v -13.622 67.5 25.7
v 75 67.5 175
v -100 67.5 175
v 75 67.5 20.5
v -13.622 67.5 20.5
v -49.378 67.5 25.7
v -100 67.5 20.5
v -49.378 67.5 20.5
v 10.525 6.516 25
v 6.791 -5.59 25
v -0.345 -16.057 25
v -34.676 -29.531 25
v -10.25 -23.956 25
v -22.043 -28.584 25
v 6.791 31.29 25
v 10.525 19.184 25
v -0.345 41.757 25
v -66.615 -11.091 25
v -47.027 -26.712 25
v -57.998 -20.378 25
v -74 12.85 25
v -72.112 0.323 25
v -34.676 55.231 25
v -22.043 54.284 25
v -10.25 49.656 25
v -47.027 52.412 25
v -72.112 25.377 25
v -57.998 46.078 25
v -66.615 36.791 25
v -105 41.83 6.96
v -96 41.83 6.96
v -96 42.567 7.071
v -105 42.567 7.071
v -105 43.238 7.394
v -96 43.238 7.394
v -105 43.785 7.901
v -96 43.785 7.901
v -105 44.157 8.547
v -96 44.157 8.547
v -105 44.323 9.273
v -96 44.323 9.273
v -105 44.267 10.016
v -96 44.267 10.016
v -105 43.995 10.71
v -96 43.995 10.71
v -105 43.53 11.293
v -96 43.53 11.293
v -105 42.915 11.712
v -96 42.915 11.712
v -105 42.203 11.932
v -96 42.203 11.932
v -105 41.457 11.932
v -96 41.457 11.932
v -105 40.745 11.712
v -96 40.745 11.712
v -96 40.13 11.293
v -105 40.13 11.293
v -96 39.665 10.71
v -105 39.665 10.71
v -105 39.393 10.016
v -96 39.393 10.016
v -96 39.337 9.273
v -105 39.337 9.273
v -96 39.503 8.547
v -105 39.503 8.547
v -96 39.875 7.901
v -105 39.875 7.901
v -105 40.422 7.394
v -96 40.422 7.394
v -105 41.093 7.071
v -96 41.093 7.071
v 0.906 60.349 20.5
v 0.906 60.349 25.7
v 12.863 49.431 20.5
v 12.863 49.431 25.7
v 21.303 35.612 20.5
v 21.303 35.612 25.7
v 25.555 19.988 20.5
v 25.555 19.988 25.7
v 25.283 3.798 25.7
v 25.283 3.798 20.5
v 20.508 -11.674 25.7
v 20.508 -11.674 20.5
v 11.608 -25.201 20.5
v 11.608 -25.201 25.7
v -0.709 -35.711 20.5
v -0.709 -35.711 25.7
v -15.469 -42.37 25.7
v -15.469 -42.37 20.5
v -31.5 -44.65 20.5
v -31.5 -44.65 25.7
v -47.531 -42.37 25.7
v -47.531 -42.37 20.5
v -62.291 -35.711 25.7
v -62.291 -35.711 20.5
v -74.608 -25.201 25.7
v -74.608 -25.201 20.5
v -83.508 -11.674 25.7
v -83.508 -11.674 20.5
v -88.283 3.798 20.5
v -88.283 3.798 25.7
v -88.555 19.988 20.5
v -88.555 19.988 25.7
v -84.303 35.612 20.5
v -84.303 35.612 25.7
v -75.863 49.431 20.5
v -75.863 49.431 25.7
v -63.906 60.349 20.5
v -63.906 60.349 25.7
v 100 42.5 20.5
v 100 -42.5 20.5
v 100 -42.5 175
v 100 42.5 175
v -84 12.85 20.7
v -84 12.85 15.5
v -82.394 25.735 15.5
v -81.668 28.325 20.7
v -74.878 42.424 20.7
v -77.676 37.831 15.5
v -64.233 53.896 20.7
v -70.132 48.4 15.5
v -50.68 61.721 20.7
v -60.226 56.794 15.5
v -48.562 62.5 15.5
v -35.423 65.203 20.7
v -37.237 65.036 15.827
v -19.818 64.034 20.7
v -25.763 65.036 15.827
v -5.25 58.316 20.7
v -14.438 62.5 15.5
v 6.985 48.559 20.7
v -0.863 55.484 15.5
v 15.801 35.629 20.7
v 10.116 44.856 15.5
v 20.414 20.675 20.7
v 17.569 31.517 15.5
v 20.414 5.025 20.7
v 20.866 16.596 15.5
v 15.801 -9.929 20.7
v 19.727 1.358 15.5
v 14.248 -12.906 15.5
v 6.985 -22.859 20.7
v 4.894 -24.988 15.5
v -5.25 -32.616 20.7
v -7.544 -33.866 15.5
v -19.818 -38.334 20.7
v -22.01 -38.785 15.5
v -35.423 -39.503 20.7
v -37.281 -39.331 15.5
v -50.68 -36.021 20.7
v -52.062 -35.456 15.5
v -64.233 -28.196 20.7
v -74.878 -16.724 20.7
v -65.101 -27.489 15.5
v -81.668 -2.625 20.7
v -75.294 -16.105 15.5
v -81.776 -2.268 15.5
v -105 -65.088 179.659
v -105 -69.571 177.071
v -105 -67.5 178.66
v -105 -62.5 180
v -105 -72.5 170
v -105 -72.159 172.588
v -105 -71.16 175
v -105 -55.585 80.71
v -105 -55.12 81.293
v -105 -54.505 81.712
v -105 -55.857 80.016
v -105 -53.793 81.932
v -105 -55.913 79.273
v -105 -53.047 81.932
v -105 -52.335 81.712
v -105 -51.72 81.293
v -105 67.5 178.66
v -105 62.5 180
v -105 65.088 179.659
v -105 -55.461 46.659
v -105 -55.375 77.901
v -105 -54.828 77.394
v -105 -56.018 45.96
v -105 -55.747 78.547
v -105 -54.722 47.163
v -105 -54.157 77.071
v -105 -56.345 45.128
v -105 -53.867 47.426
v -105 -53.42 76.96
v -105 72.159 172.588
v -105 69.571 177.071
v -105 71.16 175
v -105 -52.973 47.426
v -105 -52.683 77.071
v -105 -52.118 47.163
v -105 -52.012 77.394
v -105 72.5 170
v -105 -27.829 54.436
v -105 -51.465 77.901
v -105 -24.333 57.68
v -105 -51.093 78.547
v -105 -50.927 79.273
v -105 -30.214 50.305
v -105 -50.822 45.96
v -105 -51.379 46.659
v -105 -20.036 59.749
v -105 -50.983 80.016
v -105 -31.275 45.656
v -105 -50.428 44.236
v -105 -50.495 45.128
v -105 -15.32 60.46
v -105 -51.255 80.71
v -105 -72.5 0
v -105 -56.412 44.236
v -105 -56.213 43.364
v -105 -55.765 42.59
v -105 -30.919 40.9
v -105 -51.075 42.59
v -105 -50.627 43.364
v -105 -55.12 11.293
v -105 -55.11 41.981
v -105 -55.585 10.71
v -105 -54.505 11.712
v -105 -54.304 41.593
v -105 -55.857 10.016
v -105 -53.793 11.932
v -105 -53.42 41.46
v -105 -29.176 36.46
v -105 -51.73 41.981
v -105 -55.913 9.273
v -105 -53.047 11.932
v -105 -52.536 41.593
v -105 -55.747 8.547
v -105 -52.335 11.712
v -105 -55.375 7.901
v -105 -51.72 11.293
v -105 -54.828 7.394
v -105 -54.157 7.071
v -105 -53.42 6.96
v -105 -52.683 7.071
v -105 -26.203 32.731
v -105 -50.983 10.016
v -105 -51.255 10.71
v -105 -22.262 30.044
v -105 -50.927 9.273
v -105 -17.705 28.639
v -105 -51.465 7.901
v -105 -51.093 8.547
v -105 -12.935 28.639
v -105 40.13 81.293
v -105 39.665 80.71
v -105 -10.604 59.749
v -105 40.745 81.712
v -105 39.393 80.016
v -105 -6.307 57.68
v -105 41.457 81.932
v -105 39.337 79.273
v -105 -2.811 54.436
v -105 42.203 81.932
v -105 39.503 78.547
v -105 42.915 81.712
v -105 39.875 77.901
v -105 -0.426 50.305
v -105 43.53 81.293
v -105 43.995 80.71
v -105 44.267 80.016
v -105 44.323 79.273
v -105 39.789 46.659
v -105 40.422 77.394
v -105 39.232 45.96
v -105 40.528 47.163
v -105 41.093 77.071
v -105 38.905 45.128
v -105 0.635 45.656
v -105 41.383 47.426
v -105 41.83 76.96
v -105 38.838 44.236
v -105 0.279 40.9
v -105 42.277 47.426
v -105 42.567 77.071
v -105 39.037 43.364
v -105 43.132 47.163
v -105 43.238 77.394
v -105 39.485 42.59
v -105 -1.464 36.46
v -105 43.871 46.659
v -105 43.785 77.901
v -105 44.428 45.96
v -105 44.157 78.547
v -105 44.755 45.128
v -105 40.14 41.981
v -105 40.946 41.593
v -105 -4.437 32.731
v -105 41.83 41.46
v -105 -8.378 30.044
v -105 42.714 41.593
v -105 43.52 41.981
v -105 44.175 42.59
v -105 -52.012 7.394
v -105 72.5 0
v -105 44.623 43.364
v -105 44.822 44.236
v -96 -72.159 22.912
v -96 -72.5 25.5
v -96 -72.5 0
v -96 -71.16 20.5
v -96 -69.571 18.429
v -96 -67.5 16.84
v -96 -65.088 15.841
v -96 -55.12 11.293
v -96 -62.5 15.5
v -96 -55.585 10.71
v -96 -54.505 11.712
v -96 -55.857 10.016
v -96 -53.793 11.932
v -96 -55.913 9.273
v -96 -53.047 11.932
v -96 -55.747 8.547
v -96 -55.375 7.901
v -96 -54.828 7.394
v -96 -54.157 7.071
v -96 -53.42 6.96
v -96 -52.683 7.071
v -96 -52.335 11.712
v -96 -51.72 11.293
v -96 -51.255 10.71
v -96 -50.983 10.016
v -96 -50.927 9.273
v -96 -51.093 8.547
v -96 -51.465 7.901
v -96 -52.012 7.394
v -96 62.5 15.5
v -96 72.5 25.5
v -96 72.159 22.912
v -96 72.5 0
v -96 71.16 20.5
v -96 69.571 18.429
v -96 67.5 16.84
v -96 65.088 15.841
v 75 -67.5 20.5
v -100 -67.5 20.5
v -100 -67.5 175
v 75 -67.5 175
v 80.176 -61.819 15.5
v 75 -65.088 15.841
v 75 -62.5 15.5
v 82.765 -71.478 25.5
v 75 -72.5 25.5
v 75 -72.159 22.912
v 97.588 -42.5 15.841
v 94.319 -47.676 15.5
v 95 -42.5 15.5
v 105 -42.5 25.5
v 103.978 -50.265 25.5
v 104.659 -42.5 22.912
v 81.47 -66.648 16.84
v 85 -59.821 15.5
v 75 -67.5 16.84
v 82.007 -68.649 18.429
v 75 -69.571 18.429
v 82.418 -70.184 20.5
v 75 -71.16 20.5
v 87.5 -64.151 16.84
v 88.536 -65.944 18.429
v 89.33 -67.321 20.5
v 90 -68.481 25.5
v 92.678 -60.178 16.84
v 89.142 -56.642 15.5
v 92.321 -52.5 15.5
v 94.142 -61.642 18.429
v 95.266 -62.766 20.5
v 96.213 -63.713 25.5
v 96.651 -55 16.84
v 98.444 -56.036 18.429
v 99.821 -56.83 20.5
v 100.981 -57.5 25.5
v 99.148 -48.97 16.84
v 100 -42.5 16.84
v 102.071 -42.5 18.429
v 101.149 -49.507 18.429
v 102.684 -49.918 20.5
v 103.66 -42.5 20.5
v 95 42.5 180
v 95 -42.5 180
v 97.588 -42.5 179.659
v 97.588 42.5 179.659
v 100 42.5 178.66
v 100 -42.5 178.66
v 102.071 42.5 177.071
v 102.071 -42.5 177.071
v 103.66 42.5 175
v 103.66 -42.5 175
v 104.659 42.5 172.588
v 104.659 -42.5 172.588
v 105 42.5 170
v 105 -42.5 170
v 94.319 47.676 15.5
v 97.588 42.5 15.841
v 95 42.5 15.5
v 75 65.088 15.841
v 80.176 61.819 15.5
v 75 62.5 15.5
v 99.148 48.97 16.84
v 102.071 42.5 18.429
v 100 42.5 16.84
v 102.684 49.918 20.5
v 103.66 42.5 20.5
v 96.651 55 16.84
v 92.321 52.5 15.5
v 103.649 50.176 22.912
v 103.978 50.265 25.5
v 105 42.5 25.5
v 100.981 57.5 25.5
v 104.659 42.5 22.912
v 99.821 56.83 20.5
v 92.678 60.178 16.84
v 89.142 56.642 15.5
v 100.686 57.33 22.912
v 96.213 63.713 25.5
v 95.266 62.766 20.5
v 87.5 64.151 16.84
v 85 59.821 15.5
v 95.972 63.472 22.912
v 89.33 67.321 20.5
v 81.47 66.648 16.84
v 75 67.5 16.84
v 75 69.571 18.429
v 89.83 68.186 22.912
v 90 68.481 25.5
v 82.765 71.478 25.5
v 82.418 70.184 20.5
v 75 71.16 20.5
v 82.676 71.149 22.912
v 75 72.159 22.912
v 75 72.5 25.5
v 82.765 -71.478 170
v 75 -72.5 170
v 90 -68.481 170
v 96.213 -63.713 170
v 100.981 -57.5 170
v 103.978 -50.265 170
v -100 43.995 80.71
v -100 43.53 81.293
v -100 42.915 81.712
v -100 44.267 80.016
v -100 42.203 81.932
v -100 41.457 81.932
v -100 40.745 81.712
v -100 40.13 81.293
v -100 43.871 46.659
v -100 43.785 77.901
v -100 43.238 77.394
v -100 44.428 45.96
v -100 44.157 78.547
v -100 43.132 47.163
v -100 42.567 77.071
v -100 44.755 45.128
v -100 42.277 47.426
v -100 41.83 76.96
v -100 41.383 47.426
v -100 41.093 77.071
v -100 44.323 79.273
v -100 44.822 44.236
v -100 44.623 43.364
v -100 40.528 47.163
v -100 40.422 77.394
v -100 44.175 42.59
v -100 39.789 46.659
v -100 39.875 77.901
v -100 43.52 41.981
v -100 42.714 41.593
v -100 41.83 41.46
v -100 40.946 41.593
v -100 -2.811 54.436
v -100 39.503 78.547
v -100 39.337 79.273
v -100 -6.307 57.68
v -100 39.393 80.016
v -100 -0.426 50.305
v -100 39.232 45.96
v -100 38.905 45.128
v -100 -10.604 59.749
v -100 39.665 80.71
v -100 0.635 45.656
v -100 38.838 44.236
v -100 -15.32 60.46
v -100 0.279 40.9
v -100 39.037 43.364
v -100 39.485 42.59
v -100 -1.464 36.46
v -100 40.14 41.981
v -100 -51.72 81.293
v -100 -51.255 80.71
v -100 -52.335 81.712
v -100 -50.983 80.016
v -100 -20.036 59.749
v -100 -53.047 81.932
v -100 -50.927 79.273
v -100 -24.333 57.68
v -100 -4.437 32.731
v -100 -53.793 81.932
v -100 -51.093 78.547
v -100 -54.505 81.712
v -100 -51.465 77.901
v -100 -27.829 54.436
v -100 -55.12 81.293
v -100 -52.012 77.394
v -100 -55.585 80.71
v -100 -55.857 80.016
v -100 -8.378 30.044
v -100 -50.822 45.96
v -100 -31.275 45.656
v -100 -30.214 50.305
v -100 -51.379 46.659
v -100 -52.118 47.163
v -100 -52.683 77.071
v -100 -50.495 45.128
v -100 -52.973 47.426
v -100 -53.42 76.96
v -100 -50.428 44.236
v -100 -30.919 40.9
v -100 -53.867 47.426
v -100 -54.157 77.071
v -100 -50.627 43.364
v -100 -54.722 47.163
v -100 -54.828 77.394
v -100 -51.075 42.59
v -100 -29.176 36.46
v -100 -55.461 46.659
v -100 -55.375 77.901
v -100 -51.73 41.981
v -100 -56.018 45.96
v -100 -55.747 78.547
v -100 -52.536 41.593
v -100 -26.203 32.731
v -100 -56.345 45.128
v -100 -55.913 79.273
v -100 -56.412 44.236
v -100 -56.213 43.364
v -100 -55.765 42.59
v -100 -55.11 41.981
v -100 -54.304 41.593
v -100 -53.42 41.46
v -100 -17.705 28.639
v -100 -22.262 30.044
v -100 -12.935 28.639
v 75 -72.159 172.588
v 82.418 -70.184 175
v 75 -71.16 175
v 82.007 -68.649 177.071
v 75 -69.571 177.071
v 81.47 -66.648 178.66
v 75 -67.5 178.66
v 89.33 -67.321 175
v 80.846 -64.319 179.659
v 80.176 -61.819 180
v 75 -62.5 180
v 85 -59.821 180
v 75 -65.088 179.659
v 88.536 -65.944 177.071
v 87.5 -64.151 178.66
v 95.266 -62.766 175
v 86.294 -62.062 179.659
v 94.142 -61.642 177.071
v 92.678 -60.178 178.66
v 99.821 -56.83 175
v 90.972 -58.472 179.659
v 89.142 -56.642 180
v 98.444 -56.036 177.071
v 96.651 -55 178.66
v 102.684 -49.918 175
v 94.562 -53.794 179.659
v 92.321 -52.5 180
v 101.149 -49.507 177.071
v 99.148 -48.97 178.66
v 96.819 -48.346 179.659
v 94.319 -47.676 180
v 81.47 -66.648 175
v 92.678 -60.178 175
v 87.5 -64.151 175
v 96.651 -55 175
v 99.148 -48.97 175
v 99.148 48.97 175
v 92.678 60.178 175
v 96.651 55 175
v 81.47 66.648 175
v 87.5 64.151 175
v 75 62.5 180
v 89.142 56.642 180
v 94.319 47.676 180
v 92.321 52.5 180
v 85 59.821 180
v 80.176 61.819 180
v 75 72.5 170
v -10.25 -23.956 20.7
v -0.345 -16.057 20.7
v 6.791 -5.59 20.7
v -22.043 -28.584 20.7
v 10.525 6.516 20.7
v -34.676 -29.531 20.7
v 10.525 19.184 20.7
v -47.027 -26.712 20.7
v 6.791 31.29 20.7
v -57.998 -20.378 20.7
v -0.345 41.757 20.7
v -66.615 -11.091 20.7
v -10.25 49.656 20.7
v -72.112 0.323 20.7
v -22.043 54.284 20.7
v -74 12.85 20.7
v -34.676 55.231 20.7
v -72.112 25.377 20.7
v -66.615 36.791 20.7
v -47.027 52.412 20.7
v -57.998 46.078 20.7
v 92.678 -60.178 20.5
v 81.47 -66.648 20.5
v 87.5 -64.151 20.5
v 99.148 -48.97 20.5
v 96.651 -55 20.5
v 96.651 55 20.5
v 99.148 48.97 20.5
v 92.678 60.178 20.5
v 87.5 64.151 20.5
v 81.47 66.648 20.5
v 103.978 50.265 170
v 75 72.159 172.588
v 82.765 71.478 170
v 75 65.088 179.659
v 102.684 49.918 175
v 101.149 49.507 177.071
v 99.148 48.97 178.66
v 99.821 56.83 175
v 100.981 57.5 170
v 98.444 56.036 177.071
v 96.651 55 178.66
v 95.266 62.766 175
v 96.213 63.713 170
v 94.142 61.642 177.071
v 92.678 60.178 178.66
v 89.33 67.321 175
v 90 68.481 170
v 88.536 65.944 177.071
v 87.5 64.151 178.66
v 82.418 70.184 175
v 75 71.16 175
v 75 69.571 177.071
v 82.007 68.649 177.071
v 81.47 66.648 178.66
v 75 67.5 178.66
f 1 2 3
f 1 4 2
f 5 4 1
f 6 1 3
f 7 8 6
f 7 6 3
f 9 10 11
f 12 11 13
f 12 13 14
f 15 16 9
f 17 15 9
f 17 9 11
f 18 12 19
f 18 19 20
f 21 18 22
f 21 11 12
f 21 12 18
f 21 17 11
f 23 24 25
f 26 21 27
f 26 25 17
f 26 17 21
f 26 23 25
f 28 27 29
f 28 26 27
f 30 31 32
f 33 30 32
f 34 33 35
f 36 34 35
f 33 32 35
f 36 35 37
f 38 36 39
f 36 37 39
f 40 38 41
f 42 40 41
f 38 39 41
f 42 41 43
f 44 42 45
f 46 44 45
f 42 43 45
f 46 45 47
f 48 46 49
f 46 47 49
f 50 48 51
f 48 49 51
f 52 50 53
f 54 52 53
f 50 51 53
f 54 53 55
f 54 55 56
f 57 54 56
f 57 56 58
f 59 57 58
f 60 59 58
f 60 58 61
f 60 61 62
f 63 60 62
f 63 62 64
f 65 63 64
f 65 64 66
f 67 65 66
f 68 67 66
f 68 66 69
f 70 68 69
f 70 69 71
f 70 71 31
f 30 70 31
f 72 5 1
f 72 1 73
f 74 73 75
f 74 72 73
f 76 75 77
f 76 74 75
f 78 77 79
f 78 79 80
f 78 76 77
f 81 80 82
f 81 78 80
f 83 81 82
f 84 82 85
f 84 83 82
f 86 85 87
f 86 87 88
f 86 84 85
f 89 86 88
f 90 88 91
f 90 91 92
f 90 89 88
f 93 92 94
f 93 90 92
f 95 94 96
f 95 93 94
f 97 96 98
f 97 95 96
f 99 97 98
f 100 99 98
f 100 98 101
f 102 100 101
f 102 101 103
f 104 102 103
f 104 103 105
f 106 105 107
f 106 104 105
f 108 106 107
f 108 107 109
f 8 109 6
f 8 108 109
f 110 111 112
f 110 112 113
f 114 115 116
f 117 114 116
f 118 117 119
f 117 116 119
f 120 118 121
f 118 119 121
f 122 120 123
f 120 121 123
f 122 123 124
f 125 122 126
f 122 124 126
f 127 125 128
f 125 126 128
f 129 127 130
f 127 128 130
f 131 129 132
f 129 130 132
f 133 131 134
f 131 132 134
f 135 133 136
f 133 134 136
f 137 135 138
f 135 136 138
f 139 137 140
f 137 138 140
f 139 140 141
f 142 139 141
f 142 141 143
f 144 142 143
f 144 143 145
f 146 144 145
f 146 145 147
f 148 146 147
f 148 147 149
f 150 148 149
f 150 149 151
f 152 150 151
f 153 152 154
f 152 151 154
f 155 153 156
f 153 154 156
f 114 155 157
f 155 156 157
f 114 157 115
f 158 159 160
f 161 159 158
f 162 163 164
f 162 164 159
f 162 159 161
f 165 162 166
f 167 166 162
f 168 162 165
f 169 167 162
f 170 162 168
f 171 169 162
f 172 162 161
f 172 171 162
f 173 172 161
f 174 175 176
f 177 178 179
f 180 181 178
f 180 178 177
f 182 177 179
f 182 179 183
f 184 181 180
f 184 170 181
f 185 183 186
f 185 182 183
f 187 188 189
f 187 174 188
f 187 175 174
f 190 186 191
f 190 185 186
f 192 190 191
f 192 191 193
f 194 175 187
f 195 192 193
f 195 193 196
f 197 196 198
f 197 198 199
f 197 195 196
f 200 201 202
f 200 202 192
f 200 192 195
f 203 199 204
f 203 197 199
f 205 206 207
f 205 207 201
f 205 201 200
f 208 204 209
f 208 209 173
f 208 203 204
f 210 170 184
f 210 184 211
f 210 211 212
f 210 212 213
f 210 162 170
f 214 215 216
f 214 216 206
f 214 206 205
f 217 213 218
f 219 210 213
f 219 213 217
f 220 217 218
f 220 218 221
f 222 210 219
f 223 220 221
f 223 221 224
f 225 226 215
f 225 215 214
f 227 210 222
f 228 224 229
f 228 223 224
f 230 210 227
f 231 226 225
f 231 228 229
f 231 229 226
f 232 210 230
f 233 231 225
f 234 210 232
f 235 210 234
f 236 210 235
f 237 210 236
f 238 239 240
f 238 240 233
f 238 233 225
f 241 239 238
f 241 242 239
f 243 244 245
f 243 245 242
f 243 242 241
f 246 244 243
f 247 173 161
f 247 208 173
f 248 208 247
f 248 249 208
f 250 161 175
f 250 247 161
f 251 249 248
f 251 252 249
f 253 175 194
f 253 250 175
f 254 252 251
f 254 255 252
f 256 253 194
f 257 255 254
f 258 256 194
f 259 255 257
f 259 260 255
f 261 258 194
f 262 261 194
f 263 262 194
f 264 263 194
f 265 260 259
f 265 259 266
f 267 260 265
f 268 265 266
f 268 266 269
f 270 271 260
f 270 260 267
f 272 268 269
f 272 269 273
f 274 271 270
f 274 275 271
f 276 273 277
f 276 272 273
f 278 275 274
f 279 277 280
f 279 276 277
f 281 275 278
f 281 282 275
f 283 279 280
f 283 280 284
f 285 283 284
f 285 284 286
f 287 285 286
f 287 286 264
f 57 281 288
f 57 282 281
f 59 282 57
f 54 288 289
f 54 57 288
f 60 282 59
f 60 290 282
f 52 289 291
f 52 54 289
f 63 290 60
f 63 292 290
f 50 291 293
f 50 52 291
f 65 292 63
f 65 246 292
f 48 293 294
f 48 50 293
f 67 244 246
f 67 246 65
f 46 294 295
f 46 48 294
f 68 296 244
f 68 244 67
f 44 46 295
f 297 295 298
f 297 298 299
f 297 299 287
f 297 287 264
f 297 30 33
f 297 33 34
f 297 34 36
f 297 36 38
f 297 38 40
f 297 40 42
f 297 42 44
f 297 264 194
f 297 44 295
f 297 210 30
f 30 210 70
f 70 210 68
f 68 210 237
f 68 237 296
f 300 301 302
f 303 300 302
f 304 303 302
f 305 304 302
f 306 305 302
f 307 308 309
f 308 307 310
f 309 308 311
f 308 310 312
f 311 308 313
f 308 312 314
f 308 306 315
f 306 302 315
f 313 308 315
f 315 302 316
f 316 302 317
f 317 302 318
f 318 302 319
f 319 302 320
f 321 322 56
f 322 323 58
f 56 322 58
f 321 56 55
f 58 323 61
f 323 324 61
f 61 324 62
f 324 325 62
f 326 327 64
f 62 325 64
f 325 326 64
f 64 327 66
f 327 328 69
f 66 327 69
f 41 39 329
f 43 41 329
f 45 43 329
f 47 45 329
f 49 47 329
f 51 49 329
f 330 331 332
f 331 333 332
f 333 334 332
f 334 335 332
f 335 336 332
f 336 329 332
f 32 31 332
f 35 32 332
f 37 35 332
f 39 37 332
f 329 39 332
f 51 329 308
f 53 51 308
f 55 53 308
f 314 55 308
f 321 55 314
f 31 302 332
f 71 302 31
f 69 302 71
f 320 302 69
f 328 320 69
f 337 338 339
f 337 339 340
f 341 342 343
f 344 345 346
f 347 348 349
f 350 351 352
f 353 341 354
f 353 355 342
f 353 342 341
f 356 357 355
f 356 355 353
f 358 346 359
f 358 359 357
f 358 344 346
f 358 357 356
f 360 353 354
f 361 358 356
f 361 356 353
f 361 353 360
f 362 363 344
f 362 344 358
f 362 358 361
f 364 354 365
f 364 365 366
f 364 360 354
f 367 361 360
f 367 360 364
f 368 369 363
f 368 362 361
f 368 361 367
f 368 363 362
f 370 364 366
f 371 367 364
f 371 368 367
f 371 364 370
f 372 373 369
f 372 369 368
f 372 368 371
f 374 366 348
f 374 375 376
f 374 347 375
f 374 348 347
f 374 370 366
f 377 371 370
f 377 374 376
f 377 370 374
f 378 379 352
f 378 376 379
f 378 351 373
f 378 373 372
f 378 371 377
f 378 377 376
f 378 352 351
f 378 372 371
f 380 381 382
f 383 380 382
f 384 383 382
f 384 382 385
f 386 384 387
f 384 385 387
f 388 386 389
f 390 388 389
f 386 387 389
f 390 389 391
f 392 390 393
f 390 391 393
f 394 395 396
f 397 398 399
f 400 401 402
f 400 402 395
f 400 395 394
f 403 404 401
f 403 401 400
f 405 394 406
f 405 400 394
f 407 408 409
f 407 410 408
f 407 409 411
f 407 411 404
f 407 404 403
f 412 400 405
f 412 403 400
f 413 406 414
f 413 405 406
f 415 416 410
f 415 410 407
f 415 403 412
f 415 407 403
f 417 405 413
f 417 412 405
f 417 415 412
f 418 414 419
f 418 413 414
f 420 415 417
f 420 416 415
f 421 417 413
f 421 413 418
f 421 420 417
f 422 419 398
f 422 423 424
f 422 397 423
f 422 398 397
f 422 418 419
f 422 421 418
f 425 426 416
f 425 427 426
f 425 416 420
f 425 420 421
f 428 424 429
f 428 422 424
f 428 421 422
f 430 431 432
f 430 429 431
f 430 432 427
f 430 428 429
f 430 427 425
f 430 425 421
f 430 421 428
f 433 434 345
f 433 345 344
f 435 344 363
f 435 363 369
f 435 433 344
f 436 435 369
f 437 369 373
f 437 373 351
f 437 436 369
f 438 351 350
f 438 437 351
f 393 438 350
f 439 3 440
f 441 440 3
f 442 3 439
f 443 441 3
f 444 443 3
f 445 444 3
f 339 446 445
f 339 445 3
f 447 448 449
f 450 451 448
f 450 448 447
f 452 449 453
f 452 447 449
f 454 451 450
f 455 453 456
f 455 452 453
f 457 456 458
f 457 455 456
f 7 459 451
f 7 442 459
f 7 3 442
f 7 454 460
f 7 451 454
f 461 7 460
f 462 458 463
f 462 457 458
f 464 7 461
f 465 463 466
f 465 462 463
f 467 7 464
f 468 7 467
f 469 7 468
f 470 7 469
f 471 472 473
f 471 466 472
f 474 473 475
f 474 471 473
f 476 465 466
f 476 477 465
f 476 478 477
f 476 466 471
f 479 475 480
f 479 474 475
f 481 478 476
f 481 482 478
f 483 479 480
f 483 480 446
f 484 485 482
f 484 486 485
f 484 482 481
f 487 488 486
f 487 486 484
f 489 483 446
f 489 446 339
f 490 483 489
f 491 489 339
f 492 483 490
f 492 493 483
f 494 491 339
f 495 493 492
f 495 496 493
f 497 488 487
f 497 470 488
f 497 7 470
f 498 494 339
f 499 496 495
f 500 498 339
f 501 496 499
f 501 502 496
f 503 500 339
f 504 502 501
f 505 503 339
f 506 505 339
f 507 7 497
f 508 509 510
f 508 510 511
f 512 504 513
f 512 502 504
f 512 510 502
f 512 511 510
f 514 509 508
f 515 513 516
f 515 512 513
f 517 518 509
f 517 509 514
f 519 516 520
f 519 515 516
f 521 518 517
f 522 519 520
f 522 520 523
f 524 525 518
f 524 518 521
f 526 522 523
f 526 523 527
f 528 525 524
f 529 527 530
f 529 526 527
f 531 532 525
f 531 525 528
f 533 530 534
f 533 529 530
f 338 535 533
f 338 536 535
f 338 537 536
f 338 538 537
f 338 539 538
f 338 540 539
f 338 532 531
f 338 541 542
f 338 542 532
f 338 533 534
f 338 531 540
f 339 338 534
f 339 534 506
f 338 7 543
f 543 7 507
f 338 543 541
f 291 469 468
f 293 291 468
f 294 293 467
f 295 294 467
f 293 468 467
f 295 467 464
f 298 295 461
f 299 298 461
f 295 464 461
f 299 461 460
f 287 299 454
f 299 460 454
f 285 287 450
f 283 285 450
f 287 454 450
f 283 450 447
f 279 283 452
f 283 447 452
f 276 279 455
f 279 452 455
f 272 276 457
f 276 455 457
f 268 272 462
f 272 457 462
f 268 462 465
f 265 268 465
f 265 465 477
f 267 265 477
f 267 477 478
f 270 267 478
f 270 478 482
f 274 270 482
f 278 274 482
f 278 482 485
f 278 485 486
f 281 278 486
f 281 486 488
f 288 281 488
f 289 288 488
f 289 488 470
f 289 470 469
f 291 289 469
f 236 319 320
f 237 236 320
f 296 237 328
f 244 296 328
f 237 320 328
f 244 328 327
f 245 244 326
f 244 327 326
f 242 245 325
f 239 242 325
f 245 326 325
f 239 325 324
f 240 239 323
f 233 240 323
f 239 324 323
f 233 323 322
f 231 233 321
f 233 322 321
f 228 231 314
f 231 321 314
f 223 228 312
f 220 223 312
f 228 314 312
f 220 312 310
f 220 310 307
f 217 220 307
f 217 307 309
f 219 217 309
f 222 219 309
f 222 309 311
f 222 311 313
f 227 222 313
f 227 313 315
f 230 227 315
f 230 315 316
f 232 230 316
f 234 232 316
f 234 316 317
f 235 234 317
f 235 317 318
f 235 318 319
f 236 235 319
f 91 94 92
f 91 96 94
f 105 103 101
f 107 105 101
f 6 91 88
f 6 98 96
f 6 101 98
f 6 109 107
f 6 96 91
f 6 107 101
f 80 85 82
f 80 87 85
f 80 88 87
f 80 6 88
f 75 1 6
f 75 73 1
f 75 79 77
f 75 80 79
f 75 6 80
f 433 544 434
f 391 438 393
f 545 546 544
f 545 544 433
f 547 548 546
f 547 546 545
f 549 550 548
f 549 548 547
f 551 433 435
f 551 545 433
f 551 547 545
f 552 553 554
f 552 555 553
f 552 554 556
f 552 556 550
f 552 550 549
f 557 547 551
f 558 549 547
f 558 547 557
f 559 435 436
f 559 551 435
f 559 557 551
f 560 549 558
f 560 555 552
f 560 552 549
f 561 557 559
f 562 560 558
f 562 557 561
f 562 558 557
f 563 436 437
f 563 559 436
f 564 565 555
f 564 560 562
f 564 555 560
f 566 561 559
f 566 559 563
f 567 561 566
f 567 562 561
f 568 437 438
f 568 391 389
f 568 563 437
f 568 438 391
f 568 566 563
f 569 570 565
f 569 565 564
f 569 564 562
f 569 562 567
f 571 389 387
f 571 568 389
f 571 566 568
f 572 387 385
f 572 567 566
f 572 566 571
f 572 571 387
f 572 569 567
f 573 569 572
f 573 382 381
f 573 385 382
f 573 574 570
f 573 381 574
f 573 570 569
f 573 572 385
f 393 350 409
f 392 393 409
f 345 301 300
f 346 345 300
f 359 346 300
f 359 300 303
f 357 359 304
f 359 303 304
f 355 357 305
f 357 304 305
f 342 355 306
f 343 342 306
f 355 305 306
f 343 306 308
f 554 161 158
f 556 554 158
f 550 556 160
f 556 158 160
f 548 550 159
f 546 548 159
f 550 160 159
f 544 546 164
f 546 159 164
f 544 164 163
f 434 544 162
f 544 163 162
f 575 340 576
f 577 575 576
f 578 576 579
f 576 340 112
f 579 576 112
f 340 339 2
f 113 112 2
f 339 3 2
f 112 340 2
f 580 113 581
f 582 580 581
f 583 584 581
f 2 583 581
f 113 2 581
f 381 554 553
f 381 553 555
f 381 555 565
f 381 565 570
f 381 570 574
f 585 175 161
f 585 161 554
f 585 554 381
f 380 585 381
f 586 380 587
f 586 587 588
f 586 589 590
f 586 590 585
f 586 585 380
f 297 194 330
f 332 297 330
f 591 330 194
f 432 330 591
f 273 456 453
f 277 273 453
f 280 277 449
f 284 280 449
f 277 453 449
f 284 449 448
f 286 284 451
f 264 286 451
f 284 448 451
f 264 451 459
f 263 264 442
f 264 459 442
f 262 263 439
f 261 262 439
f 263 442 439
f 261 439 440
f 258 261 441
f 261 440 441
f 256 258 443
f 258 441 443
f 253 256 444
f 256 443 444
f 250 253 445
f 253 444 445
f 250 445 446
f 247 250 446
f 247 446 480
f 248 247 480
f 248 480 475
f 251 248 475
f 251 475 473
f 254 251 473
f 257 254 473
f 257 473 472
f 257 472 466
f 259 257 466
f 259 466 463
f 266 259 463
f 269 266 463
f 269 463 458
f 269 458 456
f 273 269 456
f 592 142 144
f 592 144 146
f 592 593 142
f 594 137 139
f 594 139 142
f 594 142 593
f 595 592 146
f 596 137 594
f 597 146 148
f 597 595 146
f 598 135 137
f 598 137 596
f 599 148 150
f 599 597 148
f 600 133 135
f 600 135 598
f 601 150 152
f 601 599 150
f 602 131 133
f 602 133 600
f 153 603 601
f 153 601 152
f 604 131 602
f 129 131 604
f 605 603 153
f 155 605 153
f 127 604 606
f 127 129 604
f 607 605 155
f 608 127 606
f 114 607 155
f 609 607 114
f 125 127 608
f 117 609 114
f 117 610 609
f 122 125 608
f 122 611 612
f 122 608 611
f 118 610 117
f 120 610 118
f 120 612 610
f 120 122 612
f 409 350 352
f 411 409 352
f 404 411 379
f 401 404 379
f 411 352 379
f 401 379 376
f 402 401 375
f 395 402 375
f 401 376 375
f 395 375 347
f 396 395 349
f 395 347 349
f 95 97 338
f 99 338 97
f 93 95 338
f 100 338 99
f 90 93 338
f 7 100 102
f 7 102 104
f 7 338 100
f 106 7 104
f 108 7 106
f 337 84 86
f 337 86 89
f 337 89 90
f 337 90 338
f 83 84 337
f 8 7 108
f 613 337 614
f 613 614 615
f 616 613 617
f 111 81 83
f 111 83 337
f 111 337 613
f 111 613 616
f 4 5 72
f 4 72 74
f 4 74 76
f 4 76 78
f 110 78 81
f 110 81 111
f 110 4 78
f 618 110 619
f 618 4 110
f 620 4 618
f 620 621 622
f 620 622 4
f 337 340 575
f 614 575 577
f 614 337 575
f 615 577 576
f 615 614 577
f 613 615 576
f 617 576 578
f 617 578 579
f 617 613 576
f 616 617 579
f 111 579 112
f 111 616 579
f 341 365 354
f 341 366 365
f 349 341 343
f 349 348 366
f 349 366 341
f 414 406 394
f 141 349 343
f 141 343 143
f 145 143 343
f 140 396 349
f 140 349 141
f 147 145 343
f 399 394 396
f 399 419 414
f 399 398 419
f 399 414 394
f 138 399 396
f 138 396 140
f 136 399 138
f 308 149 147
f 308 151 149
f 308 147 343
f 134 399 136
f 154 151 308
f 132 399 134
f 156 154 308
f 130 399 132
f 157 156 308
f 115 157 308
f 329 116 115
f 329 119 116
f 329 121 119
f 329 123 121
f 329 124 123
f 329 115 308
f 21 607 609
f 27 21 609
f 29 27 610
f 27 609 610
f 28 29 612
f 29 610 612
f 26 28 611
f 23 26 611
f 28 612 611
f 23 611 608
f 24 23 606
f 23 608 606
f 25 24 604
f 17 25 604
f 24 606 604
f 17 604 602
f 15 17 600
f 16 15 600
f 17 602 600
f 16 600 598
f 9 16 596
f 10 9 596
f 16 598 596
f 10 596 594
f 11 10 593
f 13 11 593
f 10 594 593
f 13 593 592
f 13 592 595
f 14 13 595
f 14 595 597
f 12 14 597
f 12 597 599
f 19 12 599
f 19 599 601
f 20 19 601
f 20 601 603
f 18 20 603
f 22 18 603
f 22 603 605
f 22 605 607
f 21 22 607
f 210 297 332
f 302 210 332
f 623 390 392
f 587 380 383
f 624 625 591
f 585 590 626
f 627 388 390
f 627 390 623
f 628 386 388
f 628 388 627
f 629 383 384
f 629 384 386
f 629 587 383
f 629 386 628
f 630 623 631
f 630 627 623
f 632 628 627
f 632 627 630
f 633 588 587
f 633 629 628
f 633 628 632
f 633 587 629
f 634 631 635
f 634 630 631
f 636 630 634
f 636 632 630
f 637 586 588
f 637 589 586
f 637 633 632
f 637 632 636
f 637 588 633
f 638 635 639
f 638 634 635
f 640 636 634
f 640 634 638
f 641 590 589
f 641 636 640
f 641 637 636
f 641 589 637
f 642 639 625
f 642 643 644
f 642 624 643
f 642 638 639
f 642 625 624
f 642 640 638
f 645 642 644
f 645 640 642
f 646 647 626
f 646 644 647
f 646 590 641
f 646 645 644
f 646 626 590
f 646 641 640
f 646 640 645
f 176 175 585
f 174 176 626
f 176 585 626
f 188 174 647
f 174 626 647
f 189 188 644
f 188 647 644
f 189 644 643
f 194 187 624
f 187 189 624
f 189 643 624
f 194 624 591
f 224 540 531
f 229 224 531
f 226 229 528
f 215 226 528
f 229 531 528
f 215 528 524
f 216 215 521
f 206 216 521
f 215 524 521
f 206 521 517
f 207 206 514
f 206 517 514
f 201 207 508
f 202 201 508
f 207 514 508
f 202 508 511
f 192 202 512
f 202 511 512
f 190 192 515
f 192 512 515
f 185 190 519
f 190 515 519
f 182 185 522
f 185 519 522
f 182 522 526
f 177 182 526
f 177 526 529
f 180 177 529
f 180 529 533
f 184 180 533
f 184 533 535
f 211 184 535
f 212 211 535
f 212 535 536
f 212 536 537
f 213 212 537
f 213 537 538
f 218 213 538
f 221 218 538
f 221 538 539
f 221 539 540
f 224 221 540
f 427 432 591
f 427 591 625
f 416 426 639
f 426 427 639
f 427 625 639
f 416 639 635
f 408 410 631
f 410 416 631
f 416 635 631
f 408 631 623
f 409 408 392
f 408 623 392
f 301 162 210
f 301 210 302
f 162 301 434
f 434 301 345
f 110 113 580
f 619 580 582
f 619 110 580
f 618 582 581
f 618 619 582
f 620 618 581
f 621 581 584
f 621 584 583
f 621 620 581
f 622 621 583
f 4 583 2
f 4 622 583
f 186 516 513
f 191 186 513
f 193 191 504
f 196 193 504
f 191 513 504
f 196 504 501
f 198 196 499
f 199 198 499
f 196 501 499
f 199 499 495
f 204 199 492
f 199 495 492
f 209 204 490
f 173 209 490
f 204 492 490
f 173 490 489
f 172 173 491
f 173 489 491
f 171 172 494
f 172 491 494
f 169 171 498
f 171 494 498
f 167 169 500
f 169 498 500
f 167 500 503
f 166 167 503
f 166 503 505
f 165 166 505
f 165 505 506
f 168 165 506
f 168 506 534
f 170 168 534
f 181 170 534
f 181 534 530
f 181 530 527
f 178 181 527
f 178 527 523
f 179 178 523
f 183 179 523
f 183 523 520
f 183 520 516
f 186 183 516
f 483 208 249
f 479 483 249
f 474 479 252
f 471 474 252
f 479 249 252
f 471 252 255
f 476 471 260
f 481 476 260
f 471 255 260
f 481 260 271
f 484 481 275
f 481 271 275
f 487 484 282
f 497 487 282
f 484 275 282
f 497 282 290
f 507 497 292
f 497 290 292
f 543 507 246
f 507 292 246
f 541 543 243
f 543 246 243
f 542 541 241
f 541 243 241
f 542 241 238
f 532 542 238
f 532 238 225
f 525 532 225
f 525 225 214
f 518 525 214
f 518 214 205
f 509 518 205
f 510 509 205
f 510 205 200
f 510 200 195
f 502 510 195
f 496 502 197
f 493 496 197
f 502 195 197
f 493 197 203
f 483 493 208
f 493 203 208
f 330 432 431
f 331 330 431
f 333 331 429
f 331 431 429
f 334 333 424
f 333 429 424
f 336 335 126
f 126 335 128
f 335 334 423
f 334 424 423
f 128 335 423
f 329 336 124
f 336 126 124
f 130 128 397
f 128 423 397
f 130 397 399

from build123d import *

# Parameters (mm, degrees)
SKETCH1_W                 = 210
SKETCH1_H                 = 145
BOSS_EXTRUDE1_DEPTH       = 180
SKETCH9_W                 = 201
SKETCH9_H                 = 145
CUT_EXTRUDE4_DEPTH        = 15.5
SKETCH2_R                 = 42.5
CUT_EXTRUDE1_DEPTH        = 25
SKETCH3_R                 = 52.5
CUT_EXTRUDE2_DEPTH        = 5.2
SKETCH4_R                 = 16
CUT_EXTRUDE3_DEPTH        = 5
FILLET1_R                 = 30
SHELL1_START              = 25.7
SHELL1_DEPTH              = 149.3
SHELL1_START_2            = 20.5
SHELL1_2_DEPTH            = 5.2
M6_TAPPED_HOLE1_D         = 5
M6_TAPPED_HOLE1_DEPTH     = 10
M6_TAPPED_HOLE1_TIP       = 1.502151548
F_6_0MM_DOWEL_HOLE1_D     = 6
F_6_0MM_DOWEL_HOLE1_DEPTH = 13
F_6_0MM_DOWEL_HOLE1_TIP   = 1.802581857
FILLET2_R                 = 10


# Read off the part's stored shape, not the designer's step: Shell1
with BuildPart() as part:
    # Sketch1 → Boss-Extrude1 (new body)
    with BuildSketch(Plane.XY):
        Rectangle(SKETCH1_W, SKETCH1_H)
    extrude(amount=BOSS_EXTRUDE1_DEPTH)

    # Sketch9 → Cut-Extrude4 (cut)
    with BuildSketch(Plane(origin=(0, 0, 0), x_dir=(-1, 0, 0), z_dir=(0, 0, -1))):
        with Locations((-4.5, 0)):
            Rectangle(SKETCH9_W, SKETCH9_H)
    extrude(amount=-CUT_EXTRUDE4_DEPTH, mode=Mode.SUBTRACT)

    # Sketch2 → Cut-Extrude1 (cut)
    with BuildSketch(Plane(origin=(0, 0, 0), x_dir=(-1, 0, 0), z_dir=(0, 0, -1))):
        with Locations((31.5, 12.85)):
            Circle(SKETCH2_R)
    extrude(amount=-CUT_EXTRUDE1_DEPTH, mode=Mode.SUBTRACT)

    # Sketch3 → Cut-Extrude2 (cut)
    with BuildSketch(Plane(origin=(0, 0, 15.5), x_dir=(-1, 0, 0), z_dir=(0, 0, -1))):
        with Locations((31.5, 12.85)):
            Circle(SKETCH3_R)
    extrude(amount=-CUT_EXTRUDE2_DEPTH, mode=Mode.SUBTRACT)

    # Sketch4 → Cut-Extrude3 (cut)
    with BuildSketch(Plane.ZY.offset(105)):
        with Locations((44.46, -15.32)):
            Circle(SKETCH4_R)
    extrude(amount=-CUT_EXTRUDE3_DEPTH, mode=Mode.SUBTRACT)

    # Fillet1
    fillet1_edges = [part.edges().sort_by_distance(p)[0] for p in [
        (105, -72.5, 97.75),
        (105, 72.5, 97.75),
    ]]
    fillet(fillet1_edges, radius=FILLET1_R)

    # Shell1 outline → Shell1 (cut)
    with BuildSketch(Plane.XY.offset(SHELL1_START)):
        with BuildLine():
            Line((-100, -67.5), (75, -67.5))
            ThreePointArc((75, -67.5), (92.67766953, -60.17766953), (100, -42.5))
            Line((100, -42.5), (100, 42.5))
            ThreePointArc((100, 42.5), (92.67766953, 60.17766953), (75, 67.5))
            Line((75, 67.5), (-100, 67.5))
            Line((-100, 67.5), (-100, -67.5))
        make_face()
    extrude(amount=SHELL1_DEPTH, mode=Mode.SUBTRACT)

    # Shell1 2 outline → Shell1 2 (cut)
    with BuildSketch(Plane.XY.offset(SHELL1_START_2)):
        with BuildLine():
            Line((-100, 67.5), (-100, -67.5))
            Line((-100, -67.5), (75, -67.5))
            ThreePointArc((75, -67.5), (92.67766953, -60.17766953), (100, -42.5))
            Line((100, -42.5), (100, 42.5))
            ThreePointArc((100, 42.5), (92.67766953, 60.17766953), (75, 67.5))
            Line((75, 67.5), (-13.621870903, 67.5))
            ThreePointArc((-13.621870903, 67.5), (-31.5, -44.65), (-49.378129097, 67.5))
            Line((-49.378129097, 67.5), (-100, 67.5))
        make_face()
    extrude(amount=SHELL1_2_DEPTH, mode=Mode.SUBTRACT)

    # M6 Tapped Hole1
    with Locations(Plane.ZY.offset(105)):
        with Locations((9.46, 41.83), (79.46, 41.83), (79.46, -53.42), (9.46, -53.42)):
            Hole(M6_TAPPED_HOLE1_D / 2, depth=M6_TAPPED_HOLE1_DEPTH)
            with Locations((0, 0, -(M6_TAPPED_HOLE1_DEPTH + M6_TAPPED_HOLE1_TIP / 2))):  # 118° drill point
                Cone(0, M6_TAPPED_HOLE1_D / 2, M6_TAPPED_HOLE1_TIP, mode=Mode.SUBTRACT)

    # Ø6.0mm Dowel Hole1
    with Locations(Plane.ZY.offset(105)):
        with Locations((44.46, 41.83), (44.46, -53.42)):
            Hole(F_6_0MM_DOWEL_HOLE1_D / 2, depth=F_6_0MM_DOWEL_HOLE1_DEPTH)
            with Locations((0, 0, -(F_6_0MM_DOWEL_HOLE1_DEPTH + F_6_0MM_DOWEL_HOLE1_TIP / 2))):  # 118° drill point
                Cone(0, F_6_0MM_DOWEL_HOLE1_D / 2, F_6_0MM_DOWEL_HOLE1_TIP, mode=Mode.SUBTRACT)

    # Fillet2
    # the kernel refuses this fillet: 10 mm, written as the material it takes off along each edge
    with BuildSketch(Plane(origin=(-130, -72.5, 180), x_dir=(0, 0, -1), z_dir=(1, 0, 0))) as fillet2_piece_1:
        with BuildLine():
            CenterArc((FILLET2_R, FILLET2_R), FILLET2_R, 180, 90)
            Line((0, FILLET2_R), (0, 0))
            Line((0, 0), (FILLET2_R, 0))
        make_face()
    extrude(amount=205, mode=Mode.SUBTRACT)
    with BuildSketch(Plane(origin=(75, 72.5, 15.5), x_dir=(0, -1, 0), z_dir=(-1, 0, 0))) as fillet2_piece_2:
        with BuildLine():
            CenterArc((FILLET2_R, FILLET2_R), FILLET2_R, 180, 90)
            Line((0, FILLET2_R), (0, 0))
            Line((0, 0), (FILLET2_R, 0))
        make_face()
    extrude(amount=171, mode=Mode.SUBTRACT)
    with BuildSketch(Plane(origin=(105, -42.5, 15.5), x_dir=(-1, 0, 0), z_dir=(0, 1, 0))) as fillet2_piece_3:
        with BuildLine():
            CenterArc((FILLET2_R, FILLET2_R), FILLET2_R, 180, 90)
            Line((0, FILLET2_R), (0, 0))
            Line((0, 0), (FILLET2_R, 0))
        make_face()
    extrude(amount=85, mode=Mode.SUBTRACT)
    with BuildSketch(Plane(origin=(105, -42.5, 180), x_dir=(-1, 0, 0), z_dir=(0, 1, 0))) as fillet2_piece_4:
        with BuildLine():
            CenterArc((FILLET2_R, -FILLET2_R), FILLET2_R, 90, 90)
            Line((0, -FILLET2_R), (0, 0))
            Line((0, 0), (FILLET2_R, 0))
        make_face()
    extrude(amount=85, mode=Mode.SUBTRACT)
    with BuildSketch(Plane(origin=(-96, -72.5, 15.5), x_dir=(0, 0, 1), z_dir=(1, 0, 0))) as fillet2_piece_5:
        with BuildLine():
            CenterArc((FILLET2_R, -FILLET2_R), FILLET2_R, 90, 90)
            Line((0, -FILLET2_R), (0, 0))
            Line((0, 0), (FILLET2_R, 0))
        make_face()
    extrude(amount=171, mode=Mode.SUBTRACT)
    with BuildSketch(Plane(origin=(75, 42.5, 15.5), x_dir=(1, 0, 0), z_dir=(0, -1, 0))) as fillet2_piece_6:
        with BuildLine():
            CenterArc((30 - FILLET2_R, FILLET2_R), FILLET2_R, 270, 90)
            Line((30, FILLET2_R), (30, 0))
            Line((30, 0), (30 - FILLET2_R, 0))
        make_face()
    revolve(axis=Axis((75, 42.5, 15.5), (0, 0, 1)), revolution_arc=90, mode=Mode.SUBTRACT)
    with BuildSketch(Plane(origin=(75, -42.5, 15.5), x_dir=(0, -1, 0), z_dir=(-1, 0, 0))) as fillet2_piece_7:
        with BuildLine():
            CenterArc((30 - FILLET2_R, FILLET2_R), FILLET2_R, 270, 90)
            Line((30, FILLET2_R), (30, 0))
            Line((30, 0), (30 - FILLET2_R, 0))
        make_face()
    revolve(axis=Axis((75, -42.5, 15.5), (0, 0, 1)), revolution_arc=90, mode=Mode.SUBTRACT)
    with BuildSketch(Plane(origin=(75, 72.5, 180), x_dir=(0, -1, 0), z_dir=(-1, 0, 0))) as fillet2_piece_8:
        with BuildLine():
            CenterArc((FILLET2_R, -FILLET2_R), FILLET2_R, 90, 90)
            Line((0, -FILLET2_R), (0, 0))
            Line((0, 0), (FILLET2_R, 0))
        make_face()
    extrude(amount=205, mode=Mode.SUBTRACT)
    with BuildSketch(Plane(origin=(75, 42.5, 180), x_dir=(1, 0, 0), z_dir=(0, -1, 0))) as fillet2_piece_9:
        with BuildLine():
            CenterArc((30 - FILLET2_R, -FILLET2_R), FILLET2_R, 0, 90)
            Line((30, -FILLET2_R), (30, 0))
            Line((30, 0), (30 - FILLET2_R, 0))
        make_face()
    revolve(axis=Axis((75, 42.5, 180), (0, 0, 1)), revolution_arc=90, mode=Mode.SUBTRACT)
    with BuildSketch(Plane(origin=(75, -42.5, 180), x_dir=(0, -1, 0), z_dir=(-1, 0, 0))) as fillet2_piece_10:
        with BuildLine():
            CenterArc((30 - FILLET2_R, -FILLET2_R), FILLET2_R, 0, 90)
            Line((30 - FILLET2_R, 0), (30, 0))
            Line((30, 0), (30, -FILLET2_R))
        make_face()
    revolve(axis=Axis((75, -42.5, 180), (0, 0, 1)), revolution_arc=90, mode=Mode.SUBTRACT)


solid = part.part
